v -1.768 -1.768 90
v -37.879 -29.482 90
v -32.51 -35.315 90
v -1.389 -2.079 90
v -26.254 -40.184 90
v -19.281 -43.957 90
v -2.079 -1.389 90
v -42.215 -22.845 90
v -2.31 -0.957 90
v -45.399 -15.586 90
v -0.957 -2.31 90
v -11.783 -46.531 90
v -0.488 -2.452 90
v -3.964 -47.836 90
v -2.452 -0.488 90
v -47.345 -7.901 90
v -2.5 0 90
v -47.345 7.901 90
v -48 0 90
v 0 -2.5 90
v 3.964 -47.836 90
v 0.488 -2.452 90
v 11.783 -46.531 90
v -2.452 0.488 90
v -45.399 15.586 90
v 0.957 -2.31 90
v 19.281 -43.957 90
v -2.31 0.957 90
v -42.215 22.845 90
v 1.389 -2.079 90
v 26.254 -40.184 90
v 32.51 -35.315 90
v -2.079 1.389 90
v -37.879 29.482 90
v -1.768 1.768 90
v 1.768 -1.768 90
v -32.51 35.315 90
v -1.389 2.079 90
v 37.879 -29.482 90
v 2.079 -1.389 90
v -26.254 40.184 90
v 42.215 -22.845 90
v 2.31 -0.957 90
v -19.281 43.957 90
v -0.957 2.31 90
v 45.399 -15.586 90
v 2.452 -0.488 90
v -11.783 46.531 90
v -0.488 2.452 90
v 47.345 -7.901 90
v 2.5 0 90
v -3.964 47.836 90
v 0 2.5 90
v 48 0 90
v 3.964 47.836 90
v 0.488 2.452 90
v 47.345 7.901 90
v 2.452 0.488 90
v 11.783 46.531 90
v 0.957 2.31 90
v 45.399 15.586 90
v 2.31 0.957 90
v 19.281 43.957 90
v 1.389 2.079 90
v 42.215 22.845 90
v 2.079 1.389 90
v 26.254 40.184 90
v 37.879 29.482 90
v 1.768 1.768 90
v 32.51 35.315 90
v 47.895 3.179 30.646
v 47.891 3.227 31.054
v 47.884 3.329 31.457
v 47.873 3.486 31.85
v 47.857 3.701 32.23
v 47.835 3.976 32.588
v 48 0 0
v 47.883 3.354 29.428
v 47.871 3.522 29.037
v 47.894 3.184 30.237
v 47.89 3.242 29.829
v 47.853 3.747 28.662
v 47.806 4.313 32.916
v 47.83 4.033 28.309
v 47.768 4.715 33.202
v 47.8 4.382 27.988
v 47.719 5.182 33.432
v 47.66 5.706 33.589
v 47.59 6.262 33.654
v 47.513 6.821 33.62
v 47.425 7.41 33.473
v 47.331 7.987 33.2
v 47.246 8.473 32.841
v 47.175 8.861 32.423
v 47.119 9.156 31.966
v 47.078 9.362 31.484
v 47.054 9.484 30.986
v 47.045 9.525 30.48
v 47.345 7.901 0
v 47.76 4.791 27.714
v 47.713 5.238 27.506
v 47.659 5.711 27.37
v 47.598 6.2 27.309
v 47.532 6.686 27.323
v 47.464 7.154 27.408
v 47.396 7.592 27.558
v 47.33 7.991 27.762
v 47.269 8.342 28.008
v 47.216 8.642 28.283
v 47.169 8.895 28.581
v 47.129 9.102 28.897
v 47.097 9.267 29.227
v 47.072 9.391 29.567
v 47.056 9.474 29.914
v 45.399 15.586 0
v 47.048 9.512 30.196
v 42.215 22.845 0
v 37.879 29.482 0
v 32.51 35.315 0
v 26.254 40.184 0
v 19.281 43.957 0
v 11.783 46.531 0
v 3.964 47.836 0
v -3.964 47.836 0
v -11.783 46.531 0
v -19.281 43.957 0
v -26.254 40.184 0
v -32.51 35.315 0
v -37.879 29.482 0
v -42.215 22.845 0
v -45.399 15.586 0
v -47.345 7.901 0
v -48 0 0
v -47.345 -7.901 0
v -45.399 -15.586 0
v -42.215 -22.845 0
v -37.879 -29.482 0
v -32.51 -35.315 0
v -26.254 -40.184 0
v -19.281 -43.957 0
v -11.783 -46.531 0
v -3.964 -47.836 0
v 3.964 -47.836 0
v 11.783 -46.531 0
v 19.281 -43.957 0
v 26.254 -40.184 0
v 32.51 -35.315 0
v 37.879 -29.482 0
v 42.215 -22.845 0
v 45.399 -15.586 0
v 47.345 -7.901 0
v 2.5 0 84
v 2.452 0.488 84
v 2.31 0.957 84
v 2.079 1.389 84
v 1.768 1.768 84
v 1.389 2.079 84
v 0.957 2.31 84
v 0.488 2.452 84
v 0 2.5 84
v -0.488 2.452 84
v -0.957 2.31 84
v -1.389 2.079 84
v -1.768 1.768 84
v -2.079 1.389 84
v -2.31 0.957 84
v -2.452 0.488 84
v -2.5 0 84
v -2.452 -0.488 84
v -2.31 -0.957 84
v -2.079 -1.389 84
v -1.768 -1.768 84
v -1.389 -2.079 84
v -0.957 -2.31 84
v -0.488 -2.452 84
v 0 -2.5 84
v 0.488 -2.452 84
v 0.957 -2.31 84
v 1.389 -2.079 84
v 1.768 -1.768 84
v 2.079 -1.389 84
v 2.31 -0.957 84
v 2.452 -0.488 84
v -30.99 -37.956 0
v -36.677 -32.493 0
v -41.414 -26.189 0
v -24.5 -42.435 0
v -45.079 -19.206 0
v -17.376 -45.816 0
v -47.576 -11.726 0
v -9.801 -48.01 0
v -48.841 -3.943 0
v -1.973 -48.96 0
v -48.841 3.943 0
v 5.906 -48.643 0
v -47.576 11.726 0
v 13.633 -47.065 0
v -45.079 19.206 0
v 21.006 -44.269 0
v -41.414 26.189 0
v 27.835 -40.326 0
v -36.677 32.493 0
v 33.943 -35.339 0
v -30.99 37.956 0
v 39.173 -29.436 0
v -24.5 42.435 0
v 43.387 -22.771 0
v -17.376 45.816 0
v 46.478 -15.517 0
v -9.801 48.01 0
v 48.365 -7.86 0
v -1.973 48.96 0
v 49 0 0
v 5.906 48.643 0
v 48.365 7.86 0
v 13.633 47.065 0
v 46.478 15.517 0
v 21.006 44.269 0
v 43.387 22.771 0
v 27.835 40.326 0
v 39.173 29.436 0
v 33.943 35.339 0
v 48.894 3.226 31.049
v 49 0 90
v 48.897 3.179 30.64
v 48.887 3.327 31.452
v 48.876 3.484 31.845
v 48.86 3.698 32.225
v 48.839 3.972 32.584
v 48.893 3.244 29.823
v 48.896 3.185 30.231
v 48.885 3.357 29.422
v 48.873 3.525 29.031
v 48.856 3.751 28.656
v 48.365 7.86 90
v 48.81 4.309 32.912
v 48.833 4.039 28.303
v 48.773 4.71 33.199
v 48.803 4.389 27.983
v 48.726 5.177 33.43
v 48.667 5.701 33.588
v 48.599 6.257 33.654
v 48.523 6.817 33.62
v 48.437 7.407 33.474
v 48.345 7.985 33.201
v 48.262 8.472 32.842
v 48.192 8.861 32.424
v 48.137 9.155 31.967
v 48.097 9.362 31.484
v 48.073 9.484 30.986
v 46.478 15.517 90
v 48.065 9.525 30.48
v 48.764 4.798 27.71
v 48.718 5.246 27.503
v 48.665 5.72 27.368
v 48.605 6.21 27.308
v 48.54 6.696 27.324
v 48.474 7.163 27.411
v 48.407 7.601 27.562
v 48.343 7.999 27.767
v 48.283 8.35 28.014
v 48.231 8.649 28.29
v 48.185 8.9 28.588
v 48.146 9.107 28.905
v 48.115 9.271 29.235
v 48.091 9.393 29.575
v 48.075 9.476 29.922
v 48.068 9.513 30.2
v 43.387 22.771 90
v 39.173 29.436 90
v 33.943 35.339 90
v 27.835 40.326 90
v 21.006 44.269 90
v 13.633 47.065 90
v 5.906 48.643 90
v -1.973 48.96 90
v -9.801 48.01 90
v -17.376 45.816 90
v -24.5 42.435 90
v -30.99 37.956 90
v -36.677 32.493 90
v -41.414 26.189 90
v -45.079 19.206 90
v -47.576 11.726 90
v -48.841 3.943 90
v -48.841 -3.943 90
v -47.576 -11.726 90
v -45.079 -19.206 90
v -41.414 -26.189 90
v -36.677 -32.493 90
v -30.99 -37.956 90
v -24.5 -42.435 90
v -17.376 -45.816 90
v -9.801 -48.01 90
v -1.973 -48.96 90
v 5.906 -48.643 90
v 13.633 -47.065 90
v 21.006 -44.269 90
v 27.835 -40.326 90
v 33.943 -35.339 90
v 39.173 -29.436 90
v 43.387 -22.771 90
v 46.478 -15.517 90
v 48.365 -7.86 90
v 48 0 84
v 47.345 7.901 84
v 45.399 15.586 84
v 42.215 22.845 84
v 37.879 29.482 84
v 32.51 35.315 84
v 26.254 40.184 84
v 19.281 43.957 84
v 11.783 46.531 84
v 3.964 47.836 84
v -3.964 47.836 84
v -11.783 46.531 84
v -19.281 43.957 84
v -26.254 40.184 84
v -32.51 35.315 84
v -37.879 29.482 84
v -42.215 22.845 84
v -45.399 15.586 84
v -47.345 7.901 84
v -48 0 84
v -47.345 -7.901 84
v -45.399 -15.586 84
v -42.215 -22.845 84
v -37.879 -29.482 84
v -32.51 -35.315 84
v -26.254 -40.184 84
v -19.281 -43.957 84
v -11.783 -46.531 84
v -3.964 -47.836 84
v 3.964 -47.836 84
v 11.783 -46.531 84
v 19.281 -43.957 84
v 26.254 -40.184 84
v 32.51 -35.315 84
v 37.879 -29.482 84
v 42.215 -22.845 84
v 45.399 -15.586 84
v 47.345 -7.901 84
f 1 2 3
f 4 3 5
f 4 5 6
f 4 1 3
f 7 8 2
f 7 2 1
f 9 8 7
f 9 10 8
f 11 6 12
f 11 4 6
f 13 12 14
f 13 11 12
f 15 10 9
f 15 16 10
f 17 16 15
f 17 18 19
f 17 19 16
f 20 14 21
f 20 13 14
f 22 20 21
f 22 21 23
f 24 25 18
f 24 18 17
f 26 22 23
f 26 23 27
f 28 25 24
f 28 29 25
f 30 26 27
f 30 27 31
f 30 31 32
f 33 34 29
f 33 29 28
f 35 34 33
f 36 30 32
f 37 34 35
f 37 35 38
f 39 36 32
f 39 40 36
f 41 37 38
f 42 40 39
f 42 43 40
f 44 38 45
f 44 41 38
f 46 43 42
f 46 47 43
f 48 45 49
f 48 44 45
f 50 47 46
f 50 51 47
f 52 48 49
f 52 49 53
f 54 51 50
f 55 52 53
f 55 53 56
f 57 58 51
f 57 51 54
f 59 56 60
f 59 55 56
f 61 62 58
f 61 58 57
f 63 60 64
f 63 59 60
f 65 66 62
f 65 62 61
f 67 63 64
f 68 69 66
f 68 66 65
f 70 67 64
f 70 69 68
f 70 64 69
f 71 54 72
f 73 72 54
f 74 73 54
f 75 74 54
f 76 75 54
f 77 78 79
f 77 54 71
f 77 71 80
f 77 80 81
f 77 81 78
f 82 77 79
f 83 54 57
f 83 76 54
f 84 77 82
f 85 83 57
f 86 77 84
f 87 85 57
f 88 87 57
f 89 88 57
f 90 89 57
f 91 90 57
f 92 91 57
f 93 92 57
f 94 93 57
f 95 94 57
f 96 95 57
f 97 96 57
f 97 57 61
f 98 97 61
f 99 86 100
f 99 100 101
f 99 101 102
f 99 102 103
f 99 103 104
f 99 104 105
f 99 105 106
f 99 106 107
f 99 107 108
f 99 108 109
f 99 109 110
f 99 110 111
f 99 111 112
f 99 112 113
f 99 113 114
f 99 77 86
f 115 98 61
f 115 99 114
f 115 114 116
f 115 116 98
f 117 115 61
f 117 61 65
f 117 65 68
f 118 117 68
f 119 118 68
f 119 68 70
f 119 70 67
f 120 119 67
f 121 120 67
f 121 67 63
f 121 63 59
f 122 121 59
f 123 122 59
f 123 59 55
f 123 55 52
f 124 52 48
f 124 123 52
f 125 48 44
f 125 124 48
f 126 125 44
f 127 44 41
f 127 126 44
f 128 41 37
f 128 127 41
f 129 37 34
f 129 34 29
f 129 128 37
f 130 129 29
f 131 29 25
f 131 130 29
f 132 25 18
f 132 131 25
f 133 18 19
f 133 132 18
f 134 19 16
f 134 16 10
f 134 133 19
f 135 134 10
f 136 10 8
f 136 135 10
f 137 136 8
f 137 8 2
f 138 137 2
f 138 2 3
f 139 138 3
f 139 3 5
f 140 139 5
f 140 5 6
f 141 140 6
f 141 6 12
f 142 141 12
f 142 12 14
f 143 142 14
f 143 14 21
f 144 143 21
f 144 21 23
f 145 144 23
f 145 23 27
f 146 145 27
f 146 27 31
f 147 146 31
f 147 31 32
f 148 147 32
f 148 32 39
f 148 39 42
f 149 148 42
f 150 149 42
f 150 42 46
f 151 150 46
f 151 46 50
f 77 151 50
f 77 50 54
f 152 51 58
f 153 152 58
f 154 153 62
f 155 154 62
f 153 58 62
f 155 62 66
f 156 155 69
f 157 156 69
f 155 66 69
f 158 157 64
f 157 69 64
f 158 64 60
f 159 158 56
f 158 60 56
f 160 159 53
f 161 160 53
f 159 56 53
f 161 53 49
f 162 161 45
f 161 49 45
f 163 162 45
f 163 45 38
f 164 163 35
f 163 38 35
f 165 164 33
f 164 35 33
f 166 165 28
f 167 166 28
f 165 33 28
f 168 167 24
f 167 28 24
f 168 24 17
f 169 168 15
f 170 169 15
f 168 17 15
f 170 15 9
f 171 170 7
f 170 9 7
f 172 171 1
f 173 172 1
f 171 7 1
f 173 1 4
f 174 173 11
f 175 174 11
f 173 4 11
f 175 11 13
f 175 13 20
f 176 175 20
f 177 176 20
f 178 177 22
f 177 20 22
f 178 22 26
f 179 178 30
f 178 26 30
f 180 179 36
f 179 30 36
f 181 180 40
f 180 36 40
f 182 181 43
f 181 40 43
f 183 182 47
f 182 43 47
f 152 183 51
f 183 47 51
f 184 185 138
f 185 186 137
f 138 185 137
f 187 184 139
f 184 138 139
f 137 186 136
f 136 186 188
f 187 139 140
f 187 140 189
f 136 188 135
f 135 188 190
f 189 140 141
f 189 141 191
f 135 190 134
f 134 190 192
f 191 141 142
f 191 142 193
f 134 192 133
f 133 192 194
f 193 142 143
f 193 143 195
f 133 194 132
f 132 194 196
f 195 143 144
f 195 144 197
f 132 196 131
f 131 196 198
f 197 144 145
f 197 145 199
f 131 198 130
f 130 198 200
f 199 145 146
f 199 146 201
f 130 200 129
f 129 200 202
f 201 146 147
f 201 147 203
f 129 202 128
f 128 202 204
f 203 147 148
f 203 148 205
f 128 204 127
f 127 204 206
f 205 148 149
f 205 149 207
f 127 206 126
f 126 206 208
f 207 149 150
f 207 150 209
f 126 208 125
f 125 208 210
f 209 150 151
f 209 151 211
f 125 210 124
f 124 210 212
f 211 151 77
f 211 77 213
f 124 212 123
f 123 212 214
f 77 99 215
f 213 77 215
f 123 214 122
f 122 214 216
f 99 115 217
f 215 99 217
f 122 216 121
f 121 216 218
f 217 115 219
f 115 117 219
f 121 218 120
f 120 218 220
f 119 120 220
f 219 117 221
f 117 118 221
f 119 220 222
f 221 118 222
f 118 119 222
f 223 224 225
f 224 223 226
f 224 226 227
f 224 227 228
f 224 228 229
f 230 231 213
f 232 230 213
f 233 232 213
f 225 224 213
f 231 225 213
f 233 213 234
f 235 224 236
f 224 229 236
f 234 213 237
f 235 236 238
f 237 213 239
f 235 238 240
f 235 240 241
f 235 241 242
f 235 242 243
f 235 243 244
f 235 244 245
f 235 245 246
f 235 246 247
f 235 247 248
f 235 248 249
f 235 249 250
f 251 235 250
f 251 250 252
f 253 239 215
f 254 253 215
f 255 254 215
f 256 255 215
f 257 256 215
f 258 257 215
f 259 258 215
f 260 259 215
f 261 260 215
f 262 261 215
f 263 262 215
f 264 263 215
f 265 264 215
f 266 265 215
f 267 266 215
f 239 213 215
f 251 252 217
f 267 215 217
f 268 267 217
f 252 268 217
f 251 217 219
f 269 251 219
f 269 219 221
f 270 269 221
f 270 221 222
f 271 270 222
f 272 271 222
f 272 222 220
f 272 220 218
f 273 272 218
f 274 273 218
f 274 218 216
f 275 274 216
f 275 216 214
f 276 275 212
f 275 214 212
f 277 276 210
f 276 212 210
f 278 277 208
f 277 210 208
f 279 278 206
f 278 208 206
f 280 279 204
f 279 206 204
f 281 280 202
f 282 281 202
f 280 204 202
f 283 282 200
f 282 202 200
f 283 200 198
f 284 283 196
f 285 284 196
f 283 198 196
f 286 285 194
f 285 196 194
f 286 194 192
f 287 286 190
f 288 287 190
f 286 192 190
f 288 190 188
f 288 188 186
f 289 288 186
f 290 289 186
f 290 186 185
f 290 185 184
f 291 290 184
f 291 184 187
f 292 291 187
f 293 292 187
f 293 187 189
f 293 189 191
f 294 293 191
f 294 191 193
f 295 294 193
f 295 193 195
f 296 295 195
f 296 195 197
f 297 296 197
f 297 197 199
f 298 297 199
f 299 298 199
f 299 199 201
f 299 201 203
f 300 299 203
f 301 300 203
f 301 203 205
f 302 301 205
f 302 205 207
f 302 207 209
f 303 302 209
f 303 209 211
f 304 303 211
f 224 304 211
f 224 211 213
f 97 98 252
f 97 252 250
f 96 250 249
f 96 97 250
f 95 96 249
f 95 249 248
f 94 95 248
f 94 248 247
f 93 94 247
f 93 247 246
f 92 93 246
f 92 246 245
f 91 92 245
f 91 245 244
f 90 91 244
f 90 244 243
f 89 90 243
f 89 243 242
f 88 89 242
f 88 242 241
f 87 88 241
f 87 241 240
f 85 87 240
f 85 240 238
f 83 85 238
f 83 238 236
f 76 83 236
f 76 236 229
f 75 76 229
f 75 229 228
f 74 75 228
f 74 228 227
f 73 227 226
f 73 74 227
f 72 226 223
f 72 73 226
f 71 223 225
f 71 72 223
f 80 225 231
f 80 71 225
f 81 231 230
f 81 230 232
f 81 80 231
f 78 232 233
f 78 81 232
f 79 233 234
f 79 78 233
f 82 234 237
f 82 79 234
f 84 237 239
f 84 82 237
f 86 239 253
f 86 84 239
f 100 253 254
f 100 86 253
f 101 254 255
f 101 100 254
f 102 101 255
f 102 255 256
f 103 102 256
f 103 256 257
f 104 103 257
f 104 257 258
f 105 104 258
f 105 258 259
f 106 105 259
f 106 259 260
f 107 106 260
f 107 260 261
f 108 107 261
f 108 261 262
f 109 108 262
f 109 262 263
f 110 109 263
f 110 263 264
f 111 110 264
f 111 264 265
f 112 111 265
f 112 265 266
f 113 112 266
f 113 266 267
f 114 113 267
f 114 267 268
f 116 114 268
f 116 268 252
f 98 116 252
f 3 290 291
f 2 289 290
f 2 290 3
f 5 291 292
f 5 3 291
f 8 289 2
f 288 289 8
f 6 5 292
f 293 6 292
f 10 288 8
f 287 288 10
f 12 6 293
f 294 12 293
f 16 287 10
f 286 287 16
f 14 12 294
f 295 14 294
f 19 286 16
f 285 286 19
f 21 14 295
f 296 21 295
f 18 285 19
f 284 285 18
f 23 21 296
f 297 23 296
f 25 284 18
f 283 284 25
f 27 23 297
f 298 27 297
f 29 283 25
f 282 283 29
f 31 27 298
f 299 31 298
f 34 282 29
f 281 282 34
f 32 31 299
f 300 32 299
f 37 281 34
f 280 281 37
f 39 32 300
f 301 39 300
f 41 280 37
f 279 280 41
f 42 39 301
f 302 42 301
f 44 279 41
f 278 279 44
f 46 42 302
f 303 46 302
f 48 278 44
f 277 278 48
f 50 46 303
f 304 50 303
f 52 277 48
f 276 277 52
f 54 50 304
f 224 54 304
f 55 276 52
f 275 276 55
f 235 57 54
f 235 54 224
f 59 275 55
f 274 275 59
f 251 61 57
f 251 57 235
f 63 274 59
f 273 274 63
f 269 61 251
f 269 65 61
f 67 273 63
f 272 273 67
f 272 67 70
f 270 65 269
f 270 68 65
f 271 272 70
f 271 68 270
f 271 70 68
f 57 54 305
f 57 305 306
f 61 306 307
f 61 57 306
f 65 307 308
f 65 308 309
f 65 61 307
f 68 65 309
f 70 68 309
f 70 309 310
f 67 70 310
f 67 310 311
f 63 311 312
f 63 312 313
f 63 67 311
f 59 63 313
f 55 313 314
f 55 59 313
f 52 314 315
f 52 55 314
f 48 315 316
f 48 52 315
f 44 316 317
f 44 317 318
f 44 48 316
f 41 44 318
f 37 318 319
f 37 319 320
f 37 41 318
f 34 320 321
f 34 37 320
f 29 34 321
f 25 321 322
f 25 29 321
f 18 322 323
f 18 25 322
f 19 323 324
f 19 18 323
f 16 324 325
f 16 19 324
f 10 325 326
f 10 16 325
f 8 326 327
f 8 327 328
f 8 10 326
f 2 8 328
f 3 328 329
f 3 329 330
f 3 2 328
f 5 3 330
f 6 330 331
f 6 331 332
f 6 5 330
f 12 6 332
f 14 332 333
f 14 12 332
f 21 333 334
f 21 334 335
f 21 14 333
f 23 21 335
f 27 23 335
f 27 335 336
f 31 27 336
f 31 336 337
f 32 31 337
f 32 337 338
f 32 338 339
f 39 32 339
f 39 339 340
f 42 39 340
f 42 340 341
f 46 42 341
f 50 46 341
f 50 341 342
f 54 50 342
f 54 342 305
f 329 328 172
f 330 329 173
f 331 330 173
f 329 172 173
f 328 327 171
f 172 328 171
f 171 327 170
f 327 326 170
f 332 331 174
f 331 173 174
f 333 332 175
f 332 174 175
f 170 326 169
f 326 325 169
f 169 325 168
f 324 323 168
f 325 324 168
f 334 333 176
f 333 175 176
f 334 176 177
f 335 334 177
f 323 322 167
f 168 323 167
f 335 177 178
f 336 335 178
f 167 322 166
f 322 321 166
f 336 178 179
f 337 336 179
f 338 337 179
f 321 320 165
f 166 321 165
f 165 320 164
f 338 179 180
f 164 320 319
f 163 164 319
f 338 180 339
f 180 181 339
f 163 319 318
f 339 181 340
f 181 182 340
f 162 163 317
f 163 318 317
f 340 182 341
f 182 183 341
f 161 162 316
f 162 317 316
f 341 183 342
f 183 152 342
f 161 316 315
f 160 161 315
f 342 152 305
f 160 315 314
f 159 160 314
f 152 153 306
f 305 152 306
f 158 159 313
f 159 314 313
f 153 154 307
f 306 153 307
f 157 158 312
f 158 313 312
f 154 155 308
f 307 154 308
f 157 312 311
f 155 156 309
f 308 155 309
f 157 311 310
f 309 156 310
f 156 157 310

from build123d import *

# Parameters (mm, degrees)
F0_R     = 49
F0_R_2   = 48
F1_DEPTH = 90
F2_R     = 48
F2_R_2   = 2.5
F3_DEPTH = 6
F4_R     = 3.175
F5_DEPTH = 127


with BuildPart() as f1:
    # F0 (on Top) → F1 (new body)
    with BuildSketch(Plane.XY):
        Circle(F0_R)
        Circle(F0_R_2, mode=Mode.SUBTRACT)
    extrude(amount=F1_DEPTH)

    # F4 (on Right) → F5 (cut)
    with BuildSketch(Plane.YZ):
        with Locations((6.35, 30.48)):
            Circle(F4_R)
    extrude(amount=F5_DEPTH, mode=Mode.SUBTRACT)


with BuildPart() as f3:
    # F2 (on face) → F3 (new body)
    with BuildSketch(Plane.XY.offset(90)):
        Circle(F2_R)
        Circle(F2_R_2, mode=Mode.SUBTRACT)
    extrude(amount=-F3_DEPTH)


solid = Compound([f1.part, f3.part])
